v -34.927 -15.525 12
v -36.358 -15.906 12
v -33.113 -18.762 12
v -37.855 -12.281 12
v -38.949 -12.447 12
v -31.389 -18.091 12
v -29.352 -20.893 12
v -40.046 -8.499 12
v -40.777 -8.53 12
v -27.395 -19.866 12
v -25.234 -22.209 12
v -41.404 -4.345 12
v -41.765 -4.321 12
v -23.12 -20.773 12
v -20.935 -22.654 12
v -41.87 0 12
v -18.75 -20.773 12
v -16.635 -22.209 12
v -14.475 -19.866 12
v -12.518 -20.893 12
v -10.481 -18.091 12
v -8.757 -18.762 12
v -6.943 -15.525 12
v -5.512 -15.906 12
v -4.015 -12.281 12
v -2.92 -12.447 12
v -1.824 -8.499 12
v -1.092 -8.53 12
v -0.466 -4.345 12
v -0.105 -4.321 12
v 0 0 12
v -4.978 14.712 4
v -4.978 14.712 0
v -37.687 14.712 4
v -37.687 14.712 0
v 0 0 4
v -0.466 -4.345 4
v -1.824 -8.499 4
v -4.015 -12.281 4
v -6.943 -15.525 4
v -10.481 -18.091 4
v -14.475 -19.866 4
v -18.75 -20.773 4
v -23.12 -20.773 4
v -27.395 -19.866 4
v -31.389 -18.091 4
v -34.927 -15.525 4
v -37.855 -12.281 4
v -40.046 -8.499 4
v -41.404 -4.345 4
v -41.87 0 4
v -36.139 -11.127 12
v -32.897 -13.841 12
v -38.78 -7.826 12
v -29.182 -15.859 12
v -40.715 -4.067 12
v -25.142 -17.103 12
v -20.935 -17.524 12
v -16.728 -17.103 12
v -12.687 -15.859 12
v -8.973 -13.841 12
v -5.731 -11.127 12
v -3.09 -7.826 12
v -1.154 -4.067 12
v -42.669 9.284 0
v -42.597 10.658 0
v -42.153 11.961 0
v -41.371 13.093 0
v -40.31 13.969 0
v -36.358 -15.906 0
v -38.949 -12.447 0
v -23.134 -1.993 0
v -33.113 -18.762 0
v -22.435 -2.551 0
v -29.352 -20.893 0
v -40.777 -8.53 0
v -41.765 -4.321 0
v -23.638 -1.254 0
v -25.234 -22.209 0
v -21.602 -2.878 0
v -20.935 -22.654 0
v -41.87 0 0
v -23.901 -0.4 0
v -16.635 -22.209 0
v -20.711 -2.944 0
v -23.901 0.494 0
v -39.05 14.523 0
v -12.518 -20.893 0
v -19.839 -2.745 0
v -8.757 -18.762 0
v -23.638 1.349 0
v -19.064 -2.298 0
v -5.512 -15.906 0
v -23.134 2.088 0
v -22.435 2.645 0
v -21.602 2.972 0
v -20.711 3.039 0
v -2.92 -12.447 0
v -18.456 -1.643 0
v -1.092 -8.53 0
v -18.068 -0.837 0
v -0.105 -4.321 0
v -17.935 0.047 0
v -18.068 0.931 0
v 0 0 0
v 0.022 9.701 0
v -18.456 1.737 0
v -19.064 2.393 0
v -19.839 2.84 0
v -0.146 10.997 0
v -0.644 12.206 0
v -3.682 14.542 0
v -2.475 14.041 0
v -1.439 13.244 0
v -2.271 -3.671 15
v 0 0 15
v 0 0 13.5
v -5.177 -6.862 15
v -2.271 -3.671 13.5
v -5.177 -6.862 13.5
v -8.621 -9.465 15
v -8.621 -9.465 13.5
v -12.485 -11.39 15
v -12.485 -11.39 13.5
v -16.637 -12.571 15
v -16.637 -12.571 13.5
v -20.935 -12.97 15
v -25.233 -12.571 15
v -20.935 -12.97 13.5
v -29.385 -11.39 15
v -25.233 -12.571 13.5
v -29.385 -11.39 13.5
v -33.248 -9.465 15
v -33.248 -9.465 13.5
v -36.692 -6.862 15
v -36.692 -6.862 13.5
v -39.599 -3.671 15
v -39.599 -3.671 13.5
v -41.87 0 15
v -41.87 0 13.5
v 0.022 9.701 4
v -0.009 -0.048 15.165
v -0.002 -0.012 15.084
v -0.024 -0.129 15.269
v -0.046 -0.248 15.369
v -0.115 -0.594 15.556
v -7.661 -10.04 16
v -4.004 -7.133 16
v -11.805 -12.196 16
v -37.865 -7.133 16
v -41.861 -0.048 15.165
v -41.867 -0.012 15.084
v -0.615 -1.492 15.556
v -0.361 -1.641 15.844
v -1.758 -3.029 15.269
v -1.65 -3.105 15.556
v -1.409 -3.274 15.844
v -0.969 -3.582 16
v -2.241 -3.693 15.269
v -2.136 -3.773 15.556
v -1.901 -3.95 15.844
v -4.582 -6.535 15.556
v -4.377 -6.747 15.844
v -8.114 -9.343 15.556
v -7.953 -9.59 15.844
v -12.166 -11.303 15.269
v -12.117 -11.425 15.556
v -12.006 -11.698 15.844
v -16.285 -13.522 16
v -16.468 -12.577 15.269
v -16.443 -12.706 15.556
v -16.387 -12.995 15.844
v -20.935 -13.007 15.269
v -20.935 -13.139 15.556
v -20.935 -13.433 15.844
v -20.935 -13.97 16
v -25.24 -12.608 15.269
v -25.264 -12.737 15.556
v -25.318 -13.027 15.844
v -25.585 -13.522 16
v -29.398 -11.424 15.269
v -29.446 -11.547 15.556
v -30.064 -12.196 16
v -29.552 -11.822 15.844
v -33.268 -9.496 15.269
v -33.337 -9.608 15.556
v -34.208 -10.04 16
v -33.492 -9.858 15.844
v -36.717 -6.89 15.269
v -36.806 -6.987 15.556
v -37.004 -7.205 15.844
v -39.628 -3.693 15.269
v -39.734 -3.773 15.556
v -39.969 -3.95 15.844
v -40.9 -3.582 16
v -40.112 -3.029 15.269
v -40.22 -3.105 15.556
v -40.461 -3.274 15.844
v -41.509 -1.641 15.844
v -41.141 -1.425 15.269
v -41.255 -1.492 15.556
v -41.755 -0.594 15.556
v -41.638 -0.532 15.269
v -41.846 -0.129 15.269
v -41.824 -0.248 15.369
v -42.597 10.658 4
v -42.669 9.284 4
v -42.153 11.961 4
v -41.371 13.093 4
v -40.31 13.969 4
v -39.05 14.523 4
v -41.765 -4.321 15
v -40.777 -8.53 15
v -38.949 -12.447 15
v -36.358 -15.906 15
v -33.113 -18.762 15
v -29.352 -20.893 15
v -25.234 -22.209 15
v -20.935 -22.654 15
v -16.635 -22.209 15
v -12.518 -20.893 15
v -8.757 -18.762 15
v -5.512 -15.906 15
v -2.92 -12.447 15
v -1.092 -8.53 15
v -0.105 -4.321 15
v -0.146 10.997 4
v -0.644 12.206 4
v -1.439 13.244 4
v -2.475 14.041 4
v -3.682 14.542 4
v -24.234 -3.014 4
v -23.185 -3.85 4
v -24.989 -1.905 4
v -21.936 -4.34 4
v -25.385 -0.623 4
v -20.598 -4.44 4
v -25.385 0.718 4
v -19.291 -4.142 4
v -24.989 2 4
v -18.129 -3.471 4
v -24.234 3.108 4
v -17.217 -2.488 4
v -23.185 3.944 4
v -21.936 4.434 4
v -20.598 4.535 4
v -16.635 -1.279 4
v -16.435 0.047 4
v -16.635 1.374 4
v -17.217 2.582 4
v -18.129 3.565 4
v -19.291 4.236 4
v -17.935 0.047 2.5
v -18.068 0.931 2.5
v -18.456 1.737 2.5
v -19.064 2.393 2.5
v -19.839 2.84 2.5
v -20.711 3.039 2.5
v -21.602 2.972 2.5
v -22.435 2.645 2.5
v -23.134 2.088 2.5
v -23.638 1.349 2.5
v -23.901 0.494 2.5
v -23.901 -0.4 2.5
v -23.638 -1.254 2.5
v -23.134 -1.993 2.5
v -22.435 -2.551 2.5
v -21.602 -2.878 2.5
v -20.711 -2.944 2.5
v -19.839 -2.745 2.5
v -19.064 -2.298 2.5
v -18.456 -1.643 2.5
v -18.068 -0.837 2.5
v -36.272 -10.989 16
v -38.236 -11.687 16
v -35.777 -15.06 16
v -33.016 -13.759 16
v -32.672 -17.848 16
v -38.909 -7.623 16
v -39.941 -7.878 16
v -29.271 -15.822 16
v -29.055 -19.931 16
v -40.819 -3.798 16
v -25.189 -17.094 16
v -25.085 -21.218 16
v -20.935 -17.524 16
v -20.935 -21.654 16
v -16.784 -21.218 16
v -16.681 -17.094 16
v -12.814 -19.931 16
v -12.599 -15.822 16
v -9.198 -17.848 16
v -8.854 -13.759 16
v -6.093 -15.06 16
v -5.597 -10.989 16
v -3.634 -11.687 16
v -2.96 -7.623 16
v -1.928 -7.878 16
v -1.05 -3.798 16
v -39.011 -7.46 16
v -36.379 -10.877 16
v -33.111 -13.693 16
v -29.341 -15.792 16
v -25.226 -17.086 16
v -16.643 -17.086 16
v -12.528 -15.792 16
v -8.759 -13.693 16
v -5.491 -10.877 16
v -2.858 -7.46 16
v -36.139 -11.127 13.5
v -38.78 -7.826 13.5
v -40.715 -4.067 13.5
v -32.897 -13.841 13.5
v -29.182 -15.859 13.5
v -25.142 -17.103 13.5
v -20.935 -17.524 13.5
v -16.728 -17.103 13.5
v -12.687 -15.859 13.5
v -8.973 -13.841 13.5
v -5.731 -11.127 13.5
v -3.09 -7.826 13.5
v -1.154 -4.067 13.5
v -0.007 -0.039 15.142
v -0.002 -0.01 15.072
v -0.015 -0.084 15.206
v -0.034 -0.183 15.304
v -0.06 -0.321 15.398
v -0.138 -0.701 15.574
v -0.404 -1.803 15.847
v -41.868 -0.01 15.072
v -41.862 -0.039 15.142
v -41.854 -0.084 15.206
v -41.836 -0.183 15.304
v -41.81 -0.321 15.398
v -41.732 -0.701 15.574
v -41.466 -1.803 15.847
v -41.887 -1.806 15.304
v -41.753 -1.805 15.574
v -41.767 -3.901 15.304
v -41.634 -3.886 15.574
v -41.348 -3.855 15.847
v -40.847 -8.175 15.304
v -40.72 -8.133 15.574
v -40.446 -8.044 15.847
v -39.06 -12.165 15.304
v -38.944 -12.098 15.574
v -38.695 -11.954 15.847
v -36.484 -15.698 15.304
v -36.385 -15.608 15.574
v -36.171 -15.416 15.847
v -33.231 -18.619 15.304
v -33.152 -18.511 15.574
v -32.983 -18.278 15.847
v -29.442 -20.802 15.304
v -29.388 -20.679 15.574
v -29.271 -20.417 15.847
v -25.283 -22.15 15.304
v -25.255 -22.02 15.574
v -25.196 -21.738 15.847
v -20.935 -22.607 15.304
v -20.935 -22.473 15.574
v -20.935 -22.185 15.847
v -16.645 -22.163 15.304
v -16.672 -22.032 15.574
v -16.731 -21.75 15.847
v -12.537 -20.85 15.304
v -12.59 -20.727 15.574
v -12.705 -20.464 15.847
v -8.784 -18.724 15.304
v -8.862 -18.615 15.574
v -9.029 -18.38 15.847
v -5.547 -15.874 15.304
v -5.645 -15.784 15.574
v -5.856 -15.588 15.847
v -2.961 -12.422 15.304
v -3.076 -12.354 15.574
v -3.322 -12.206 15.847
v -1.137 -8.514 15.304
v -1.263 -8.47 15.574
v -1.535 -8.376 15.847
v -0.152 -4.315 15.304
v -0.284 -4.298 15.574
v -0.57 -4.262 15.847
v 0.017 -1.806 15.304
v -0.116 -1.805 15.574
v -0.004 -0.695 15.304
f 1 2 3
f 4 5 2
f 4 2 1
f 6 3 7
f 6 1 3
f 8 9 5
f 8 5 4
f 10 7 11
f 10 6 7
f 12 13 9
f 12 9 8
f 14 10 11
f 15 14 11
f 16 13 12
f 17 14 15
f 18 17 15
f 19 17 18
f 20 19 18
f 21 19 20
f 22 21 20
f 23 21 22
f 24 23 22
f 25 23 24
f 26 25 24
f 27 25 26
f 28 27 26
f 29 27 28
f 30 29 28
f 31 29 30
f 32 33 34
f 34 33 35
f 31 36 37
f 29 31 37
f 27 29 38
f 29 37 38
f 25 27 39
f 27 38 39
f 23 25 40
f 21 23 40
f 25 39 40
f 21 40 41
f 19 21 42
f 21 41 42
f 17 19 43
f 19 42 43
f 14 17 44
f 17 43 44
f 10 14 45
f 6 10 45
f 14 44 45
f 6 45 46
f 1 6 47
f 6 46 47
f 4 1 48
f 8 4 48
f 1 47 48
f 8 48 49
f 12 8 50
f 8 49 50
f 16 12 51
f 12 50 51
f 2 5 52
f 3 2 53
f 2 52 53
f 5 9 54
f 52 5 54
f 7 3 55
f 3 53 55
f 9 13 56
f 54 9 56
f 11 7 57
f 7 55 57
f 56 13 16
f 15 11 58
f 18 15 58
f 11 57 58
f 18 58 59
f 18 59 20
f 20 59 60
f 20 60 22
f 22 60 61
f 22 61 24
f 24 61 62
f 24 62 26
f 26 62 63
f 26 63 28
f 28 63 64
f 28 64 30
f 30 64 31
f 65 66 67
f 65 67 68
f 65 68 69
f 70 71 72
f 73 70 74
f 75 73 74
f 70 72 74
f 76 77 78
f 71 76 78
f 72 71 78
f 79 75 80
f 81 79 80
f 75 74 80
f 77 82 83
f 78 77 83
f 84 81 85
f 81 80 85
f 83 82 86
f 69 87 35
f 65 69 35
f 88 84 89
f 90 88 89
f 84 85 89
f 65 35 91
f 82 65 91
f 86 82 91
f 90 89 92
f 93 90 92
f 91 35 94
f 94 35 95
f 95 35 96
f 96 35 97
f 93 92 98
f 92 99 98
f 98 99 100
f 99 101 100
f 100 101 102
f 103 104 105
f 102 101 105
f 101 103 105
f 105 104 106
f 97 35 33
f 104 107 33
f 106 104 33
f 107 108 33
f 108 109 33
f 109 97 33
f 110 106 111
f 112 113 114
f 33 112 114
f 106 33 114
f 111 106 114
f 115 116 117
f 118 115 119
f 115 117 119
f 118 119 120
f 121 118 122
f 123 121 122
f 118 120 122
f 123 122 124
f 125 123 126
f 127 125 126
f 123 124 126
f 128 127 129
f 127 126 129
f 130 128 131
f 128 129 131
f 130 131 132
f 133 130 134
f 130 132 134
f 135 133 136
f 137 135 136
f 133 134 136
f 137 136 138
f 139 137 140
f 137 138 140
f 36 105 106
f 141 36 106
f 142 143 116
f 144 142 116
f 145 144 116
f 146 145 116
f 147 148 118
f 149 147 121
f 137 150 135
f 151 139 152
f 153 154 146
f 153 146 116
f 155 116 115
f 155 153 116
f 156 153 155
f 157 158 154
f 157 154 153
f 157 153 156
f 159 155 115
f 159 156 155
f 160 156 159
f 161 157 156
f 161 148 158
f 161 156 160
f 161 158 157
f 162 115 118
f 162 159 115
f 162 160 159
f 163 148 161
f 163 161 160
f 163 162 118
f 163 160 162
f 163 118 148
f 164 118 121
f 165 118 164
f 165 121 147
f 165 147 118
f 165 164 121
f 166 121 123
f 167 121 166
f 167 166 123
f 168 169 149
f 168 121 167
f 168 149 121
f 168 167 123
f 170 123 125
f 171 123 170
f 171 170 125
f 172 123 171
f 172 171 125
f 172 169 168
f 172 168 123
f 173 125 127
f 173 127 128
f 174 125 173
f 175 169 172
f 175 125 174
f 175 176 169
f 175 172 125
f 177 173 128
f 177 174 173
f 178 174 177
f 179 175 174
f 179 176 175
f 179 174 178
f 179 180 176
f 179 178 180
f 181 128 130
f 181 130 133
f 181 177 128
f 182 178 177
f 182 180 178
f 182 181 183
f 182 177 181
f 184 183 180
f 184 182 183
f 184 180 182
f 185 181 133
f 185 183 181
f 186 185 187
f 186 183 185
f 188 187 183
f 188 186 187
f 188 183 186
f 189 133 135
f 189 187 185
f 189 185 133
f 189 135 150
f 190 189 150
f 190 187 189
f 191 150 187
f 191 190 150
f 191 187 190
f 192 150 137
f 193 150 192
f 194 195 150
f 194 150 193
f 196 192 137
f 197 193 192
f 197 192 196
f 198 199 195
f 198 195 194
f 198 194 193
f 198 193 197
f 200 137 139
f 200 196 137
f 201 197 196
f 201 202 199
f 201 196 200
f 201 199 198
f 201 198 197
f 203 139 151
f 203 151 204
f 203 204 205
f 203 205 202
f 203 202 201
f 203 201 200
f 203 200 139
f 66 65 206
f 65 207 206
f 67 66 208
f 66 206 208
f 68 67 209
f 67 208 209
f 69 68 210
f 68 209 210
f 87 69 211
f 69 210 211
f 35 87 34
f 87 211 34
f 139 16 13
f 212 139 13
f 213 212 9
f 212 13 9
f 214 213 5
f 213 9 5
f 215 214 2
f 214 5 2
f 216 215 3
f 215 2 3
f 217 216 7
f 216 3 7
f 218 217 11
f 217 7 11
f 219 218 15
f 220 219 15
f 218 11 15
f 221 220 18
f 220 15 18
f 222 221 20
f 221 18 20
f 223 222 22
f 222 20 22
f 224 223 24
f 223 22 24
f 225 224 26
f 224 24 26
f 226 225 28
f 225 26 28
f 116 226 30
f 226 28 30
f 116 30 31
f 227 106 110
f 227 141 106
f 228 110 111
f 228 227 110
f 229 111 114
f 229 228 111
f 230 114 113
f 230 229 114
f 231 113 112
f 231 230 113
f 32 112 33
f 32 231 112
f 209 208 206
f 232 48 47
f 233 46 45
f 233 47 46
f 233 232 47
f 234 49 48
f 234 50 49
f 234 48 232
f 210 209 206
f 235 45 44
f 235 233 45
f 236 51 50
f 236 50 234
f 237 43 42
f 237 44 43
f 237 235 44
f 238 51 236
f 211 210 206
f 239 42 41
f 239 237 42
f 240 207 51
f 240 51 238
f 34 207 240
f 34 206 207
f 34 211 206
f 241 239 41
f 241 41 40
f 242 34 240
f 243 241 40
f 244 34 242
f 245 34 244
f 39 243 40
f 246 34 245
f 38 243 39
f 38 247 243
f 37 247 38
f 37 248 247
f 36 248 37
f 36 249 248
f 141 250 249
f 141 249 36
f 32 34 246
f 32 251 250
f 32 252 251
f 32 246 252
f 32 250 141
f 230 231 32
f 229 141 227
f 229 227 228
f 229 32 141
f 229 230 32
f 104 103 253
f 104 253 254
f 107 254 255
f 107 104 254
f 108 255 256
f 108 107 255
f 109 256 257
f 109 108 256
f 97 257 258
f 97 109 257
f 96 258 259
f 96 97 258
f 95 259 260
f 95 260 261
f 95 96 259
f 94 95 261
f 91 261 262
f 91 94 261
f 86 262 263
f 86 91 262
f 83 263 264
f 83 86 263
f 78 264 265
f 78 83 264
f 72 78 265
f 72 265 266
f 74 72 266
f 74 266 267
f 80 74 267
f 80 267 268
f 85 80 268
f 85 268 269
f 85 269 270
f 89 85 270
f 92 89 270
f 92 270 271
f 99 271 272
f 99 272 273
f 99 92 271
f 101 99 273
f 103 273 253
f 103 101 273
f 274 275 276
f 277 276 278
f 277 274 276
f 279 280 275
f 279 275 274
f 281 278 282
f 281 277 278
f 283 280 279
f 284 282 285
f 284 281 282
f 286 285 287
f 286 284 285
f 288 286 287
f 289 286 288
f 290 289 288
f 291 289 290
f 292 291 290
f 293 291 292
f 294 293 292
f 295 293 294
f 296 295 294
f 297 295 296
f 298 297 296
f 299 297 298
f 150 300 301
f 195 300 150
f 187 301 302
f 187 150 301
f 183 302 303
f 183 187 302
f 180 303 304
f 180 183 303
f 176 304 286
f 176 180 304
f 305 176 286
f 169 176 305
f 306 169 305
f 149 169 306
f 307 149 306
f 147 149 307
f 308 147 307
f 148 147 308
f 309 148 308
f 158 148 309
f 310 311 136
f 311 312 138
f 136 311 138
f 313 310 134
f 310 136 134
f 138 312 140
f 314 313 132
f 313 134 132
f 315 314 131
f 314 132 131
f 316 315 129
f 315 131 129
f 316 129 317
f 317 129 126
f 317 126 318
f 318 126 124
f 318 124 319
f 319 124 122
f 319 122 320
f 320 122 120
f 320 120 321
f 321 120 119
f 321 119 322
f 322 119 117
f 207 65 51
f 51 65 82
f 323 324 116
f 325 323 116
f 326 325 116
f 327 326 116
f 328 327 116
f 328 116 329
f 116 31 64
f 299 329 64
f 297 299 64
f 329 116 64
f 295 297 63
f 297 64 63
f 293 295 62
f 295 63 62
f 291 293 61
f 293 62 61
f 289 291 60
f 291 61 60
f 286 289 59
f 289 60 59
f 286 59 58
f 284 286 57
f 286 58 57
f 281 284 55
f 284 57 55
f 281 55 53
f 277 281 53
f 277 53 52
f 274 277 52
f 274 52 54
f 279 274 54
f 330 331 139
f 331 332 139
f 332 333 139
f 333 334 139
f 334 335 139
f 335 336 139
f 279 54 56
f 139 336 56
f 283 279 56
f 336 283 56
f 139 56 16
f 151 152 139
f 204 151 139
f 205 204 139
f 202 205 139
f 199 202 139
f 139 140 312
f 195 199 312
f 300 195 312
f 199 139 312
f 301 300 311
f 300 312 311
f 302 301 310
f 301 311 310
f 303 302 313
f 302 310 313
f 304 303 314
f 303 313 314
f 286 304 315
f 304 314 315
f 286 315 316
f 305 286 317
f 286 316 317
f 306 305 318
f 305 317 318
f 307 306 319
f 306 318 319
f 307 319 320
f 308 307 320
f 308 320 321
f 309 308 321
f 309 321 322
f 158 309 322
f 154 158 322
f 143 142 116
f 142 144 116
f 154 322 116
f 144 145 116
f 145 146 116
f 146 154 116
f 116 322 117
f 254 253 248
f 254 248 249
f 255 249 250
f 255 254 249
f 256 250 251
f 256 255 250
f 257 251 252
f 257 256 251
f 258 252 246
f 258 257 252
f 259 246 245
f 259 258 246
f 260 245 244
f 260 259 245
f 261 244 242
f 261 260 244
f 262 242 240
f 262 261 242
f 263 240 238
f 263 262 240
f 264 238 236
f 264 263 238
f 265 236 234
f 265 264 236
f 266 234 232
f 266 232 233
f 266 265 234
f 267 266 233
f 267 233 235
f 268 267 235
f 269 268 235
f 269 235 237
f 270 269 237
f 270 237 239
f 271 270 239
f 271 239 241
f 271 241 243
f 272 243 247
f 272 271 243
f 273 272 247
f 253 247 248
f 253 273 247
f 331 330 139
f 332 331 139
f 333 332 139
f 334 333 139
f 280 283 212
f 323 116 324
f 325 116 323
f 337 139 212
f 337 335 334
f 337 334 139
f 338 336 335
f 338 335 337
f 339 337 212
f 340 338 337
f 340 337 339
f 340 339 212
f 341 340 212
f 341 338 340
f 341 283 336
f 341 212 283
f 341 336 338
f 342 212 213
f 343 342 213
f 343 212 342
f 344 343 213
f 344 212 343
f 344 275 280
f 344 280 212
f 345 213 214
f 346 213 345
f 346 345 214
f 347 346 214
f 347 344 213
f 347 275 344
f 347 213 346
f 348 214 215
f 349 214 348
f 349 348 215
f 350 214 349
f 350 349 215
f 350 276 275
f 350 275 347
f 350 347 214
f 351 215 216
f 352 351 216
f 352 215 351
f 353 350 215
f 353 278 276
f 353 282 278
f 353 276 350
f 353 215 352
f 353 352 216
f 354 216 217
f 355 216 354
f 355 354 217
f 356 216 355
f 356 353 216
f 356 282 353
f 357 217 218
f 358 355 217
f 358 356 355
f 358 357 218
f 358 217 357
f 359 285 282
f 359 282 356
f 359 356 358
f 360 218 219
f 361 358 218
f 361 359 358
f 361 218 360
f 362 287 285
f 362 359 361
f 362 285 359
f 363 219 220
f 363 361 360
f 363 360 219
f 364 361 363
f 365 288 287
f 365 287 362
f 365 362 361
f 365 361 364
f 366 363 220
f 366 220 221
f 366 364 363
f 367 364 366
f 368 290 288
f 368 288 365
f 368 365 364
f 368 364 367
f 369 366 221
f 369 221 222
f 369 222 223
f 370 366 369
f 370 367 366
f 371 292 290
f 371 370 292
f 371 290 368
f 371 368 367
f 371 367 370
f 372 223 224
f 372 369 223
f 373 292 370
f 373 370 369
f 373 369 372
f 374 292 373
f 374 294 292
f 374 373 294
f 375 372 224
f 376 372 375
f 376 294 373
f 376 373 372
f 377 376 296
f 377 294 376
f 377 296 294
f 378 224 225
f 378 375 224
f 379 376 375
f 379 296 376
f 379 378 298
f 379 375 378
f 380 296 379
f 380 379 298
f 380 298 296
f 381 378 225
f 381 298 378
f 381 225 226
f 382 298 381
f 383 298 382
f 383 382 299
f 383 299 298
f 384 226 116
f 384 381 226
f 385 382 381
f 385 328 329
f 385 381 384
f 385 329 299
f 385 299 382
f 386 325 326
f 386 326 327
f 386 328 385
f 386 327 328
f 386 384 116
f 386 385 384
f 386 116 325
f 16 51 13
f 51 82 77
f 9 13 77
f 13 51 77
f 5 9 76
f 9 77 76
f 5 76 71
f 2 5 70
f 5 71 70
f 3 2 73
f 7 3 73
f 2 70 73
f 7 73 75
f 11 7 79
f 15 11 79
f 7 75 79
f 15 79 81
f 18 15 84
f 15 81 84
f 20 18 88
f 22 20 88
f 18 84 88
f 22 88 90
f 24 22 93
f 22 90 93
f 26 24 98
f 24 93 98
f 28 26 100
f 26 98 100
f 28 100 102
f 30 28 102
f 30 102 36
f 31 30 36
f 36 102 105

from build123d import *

# Parameters (mm, degrees)
F0_R        = 3
F1_DEPTH    = 4
F2_DEPTH    = 12
F3_START    = 12
F3_DEPTH    = 4
F4_R        = 5
F5_START    = 13.5
F5_DEPTH    = 2.5
F6_T2_ANGLE = 202.7002250933
F7_R        = 1
F8_SIZE     = 1.5


# Not quite as in the source:
# - a fillet or chamfer that OpenCascade refuses, or shapes differently, is made with other operations: its cross-section is extruded or revolved along the edge and cut away or added


with BuildPart() as f1:
    # F0 (on Top) → F1 (new body)
    with BuildSketch(Plane.XY):
        with BuildLine():
            Line((-43.1358516216, 14.7124025971), (-41.8695434246, 0))
            ThreePointArc((-41.8695434246, 0), (-20.9347717123, -12.9699445096), (0, 0))
            Line((0, 0), (0.0331684333, 14.7124025971))
            Line((0.0331684333, 14.7124025971), (-43.1358516216, 14.7124025971))
        make_face()
        with Locations((-20.9347717123, 0.0471964775)):
            Circle(F0_R, mode=Mode.SUBTRACT)
        with BuildLine():
            ThreePointArc((0, 0), (-20.9347717123, -20.8876284359), (-41.8695434246, 0))
            ThreePointArc((-41.8695434246, 0), (-20.9347717123, -22.6538843228), (0, 0))
        make_face()
        with BuildLine():
            ThreePointArc((0, 0), (-20.9347717123, -17.5236648917), (-41.8695434246, 0))
            ThreePointArc((-41.8695434246, 0), (-20.9347717123, -20.8876284359), (0, 0))
        make_face()
        with BuildLine():
            ThreePointArc((0, 0), (-20.9347717123, -12.9699445096), (-41.8695434246, 0))
            ThreePointArc((-41.8695434246, 0), (-20.9347717123, -17.5236648917), (0, 0))
        make_face()
    extrude(amount=F1_DEPTH)

    # F0 (on Top) → F2 (join)
    with BuildSketch(Plane.XY):
        with BuildLine():
            ThreePointArc((0, 0), (-20.9347717123, -20.8876284359), (-41.8695434246, 0))
            ThreePointArc((-41.8695434246, 0), (-20.9347717123, -22.6538843228), (0, 0))
        make_face()
    extrude(amount=F2_DEPTH)

    # F4
    f4_edges = [f1.edges().sort_by_distance(p)[0] for p in [
        (0.033168, 14.712403, 2),
        (-43.135852, 14.712403, 2),
    ]]
    fillet(f4_edges, radius=F4_R)

    # F8
    f8_edges = [f1.edges().sort_by_distance(p)[0] for p in [
        (-23.934772, 0.047196, 4),
    ]]
    chamfer(f8_edges, length=F8_SIZE)


with BuildPart() as f3:
    # F0 (on Top) → F3 (new body)
    with BuildSketch(Plane.XY.offset(F3_START)):
        with BuildLine():
            ThreePointArc((0, 0), (-20.9347717123, -17.5236648917), (-41.8695434246, 0))
            ThreePointArc((-41.8695434246, 0), (-20.9347717123, -20.8876284359), (0, 0))
        make_face()
        with BuildLine():
            ThreePointArc((0, 0), (-20.9347717123, -20.8876284359), (-41.8695434246, 0))
            ThreePointArc((-41.8695434246, 0), (-20.9347717123, -22.6538843228), (0, 0))
        make_face()
    extrude(amount=F3_DEPTH)

    # F6: fillet of radius 1 on 1 edges, made by hand

    # F6_s1 → F6_t2 (revolve, cut)
    with BuildSketch(Plane(origin=(-1.1299645501, -5.6292919355, 0), x_dir=(0, 0, 1), z_dir=(0.1968037431, 0.9804429033, 0))):
        with BuildLine():
            ThreePointArc((15, -41.1998577327), (15.7071067812, -40.9069645139), (16, -40.1998577327))
            Line((16, -40.1998577327), (16, -41.1998577327))
            Line((16, -41.1998577327), (15, -41.1998577327))
        make_face()
    revolve(axis=Axis((-20.9347717123, -1.6538843228, 16), (0, 0, 1)), revolution_arc=F6_T2_ANGLE, mode=Mode.SUBTRACT)


with BuildPart() as f5:
    # F0 (on Top) → F5 (new body)
    with BuildSketch(Plane.XY.offset(F5_START)):
        with BuildLine():
            ThreePointArc((0, 0), (-20.9347717123, -12.9699445096), (-41.8695434246, 0))
            ThreePointArc((-41.8695434246, 0), (-20.9347717123, -17.5236648917), (0, 0))
        make_face()
    extrude(amount=F5_DEPTH)

    # F7
    f7_edges = [f5.edges().sort_by_distance(p)[0] for p in [
        (-20.934772, -12.969945, 16),
    ]]
    fillet(f7_edges, radius=F7_R)


solid = Compound([f1.part, f3.part, f5.part])
